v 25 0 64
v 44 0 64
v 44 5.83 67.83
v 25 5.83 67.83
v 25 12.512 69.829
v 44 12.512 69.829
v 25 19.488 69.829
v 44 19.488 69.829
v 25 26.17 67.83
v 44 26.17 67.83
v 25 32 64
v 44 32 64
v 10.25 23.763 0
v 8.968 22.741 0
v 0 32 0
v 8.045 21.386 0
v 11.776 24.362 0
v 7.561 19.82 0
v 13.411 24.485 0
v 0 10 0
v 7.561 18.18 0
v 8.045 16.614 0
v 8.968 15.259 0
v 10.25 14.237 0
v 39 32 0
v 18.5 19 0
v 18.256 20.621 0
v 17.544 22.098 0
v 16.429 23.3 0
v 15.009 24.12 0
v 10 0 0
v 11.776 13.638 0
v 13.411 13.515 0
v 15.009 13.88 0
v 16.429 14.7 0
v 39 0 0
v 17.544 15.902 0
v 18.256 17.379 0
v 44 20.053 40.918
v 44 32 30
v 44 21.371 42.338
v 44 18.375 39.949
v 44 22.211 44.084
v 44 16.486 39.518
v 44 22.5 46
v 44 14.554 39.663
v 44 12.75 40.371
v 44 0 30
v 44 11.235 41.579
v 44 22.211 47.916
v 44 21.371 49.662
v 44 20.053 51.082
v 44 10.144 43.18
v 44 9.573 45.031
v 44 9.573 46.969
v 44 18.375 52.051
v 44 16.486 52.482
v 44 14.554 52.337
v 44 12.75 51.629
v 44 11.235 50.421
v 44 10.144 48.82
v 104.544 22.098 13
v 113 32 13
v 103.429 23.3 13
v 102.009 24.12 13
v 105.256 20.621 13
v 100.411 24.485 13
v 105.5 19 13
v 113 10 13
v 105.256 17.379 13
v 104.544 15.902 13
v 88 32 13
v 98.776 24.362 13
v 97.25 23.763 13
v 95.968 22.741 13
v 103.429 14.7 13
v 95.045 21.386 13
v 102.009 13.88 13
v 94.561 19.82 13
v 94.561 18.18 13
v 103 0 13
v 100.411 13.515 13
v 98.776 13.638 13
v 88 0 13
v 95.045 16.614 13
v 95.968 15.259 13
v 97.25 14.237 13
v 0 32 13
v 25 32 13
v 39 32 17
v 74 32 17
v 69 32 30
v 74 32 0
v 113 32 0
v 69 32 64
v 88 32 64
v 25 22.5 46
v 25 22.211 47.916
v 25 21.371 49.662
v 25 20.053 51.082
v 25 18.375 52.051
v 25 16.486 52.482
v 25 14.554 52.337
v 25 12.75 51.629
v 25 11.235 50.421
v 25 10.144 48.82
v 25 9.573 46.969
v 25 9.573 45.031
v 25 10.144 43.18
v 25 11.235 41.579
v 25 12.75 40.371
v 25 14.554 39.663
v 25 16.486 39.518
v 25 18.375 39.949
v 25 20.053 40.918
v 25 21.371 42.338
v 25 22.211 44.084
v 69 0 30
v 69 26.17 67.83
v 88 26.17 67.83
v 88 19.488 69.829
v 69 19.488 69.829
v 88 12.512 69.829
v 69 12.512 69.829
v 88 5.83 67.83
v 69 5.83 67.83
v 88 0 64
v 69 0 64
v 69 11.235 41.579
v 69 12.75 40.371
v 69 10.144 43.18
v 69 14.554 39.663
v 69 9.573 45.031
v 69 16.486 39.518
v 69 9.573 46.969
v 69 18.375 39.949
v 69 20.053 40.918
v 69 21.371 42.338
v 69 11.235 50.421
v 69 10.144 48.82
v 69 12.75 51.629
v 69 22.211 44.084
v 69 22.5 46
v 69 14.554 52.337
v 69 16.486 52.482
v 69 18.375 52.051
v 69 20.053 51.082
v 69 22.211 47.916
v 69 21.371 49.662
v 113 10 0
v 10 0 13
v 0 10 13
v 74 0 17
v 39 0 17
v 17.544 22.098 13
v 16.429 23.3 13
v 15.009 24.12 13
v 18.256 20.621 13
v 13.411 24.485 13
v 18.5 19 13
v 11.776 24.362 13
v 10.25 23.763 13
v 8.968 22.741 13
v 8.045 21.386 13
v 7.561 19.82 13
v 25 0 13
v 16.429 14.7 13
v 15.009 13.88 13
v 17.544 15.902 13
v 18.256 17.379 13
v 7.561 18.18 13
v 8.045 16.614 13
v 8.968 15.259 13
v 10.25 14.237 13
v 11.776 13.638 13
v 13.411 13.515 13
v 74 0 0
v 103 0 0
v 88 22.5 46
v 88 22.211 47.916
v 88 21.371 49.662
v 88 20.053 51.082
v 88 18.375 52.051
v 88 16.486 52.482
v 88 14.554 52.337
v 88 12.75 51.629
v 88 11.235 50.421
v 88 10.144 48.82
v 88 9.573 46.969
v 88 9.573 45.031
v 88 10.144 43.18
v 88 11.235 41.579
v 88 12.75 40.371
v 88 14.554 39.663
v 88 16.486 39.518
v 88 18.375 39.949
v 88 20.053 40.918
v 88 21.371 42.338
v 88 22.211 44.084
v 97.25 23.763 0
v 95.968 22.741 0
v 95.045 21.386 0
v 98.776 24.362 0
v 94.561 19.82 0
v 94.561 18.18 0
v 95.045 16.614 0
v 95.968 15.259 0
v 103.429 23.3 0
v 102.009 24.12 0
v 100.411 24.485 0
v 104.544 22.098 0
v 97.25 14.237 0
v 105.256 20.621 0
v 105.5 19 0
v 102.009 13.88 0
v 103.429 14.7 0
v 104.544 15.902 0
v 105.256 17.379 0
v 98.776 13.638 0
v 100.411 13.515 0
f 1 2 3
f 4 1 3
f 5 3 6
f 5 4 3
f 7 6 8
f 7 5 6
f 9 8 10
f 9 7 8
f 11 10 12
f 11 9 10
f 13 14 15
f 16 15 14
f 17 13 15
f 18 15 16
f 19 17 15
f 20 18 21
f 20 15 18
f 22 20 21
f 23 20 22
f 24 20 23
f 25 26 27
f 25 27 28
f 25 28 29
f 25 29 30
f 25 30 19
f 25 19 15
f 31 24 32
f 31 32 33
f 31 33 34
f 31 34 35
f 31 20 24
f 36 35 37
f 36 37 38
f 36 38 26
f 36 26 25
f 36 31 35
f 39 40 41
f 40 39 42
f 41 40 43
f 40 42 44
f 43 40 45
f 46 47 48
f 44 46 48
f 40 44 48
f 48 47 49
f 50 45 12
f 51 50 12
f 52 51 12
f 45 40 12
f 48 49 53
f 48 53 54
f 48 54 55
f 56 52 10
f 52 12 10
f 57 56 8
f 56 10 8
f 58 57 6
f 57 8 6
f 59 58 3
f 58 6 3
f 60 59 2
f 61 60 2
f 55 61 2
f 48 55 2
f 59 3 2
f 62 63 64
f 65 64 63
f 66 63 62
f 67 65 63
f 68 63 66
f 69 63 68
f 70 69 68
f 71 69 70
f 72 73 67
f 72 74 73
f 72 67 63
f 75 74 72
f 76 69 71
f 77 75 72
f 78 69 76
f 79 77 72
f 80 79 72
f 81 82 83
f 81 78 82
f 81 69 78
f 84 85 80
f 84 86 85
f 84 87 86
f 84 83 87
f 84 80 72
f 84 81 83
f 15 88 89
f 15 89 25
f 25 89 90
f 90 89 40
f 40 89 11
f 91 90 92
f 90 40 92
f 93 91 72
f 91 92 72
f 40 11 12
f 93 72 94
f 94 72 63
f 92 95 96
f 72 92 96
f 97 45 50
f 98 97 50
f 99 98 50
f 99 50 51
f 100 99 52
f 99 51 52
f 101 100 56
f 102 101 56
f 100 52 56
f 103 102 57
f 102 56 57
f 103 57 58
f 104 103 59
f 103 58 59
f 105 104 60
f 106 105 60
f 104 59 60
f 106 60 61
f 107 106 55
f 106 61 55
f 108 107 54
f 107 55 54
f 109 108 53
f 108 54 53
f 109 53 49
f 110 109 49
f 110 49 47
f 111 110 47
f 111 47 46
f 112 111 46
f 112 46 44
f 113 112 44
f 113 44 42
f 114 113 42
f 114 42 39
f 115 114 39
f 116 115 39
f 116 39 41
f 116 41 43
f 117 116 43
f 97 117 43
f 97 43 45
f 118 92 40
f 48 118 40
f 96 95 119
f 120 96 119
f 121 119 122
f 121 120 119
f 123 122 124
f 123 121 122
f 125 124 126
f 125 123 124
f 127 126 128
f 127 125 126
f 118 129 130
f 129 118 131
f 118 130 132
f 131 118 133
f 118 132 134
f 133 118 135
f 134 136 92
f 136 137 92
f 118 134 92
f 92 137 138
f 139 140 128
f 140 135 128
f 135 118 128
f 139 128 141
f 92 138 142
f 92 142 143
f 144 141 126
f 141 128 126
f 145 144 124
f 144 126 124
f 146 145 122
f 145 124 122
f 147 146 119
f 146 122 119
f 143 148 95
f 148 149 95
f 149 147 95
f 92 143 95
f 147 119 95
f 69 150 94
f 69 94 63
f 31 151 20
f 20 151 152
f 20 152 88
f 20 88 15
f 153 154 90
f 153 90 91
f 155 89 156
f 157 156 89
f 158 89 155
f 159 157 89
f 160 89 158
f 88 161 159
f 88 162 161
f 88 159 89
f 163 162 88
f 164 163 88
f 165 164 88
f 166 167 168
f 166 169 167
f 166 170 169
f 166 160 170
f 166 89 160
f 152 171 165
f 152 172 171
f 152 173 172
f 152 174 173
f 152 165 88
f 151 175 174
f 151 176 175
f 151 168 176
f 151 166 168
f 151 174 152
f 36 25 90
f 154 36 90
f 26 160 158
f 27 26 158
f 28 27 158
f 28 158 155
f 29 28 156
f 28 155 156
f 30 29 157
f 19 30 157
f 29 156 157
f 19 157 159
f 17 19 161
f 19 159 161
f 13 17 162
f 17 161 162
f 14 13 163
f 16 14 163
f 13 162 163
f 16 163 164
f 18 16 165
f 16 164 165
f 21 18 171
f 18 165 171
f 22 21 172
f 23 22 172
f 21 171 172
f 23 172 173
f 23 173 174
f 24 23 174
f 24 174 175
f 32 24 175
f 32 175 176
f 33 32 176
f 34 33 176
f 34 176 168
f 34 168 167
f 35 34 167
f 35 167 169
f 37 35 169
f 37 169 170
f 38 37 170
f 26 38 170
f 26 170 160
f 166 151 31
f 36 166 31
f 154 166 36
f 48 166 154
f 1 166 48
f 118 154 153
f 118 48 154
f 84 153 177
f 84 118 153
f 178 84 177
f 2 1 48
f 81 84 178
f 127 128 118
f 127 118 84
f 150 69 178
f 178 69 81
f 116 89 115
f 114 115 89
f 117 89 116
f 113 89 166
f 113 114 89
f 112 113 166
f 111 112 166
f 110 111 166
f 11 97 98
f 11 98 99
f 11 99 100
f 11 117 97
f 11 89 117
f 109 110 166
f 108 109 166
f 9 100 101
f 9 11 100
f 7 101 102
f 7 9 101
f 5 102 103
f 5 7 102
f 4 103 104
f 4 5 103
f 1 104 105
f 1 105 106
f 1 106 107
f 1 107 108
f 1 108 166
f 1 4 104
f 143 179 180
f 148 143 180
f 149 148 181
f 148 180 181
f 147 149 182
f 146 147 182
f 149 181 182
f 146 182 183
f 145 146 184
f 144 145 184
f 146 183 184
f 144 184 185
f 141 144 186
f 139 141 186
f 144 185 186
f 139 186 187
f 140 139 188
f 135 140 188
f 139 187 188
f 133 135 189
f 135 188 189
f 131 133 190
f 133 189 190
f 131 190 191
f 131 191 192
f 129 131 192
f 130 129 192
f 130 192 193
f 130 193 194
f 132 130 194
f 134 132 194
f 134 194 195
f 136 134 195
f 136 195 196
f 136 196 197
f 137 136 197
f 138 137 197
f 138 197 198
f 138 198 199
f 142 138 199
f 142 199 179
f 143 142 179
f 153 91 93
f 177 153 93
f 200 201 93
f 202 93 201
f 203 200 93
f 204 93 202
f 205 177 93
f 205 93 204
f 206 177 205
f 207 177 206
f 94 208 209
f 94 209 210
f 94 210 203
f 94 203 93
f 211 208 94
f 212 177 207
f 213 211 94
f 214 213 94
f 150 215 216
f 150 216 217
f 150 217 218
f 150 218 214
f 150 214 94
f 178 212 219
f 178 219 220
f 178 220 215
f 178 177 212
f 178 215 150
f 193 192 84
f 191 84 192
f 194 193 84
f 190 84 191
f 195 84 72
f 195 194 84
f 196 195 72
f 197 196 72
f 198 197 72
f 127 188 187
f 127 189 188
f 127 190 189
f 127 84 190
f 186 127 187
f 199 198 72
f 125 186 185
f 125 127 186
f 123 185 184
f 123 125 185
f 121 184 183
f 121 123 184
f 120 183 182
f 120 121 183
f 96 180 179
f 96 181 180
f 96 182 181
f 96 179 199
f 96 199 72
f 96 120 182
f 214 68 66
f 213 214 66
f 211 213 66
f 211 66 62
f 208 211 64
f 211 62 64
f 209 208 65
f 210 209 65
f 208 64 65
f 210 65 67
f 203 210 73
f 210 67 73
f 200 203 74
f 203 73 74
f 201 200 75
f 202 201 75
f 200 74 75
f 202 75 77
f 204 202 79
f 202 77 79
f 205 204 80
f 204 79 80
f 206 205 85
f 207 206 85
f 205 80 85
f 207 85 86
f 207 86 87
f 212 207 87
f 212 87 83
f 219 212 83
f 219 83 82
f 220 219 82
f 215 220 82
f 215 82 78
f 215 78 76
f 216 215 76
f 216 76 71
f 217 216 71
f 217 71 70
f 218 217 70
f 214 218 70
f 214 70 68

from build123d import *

# Parameters (mm, degrees)
F1_DEPTH  = 32
F3_DEPTH  = 13.001
F5_DEPTH  = 13.001
F6_R      = 5.5
F7_DEPTH  = 13.001
F9_DEPTH  = 19
F11_DEPTH = 19
F13_R     = 6.5
F14_DEPTH = 100.001


with BuildPart() as f1:
    # F0 (on Front) → F1 (new body)
    with BuildSketch(Plane.XZ):
        Polygon((0, 13), (0, 0), (39, 0), (39, 17), (74, 17), (74, 0), (113, 0), (113, 13), (88, 13), (88, 64), (69, 64), (69, 30), (44, 30), (44, 64), (25, 64), (25, 13), align=None)
    extrude(amount=-F1_DEPTH)

    # F2 (on face) → F3 (cut, through all)
    with BuildSketch(Plane.XY.offset(13)):
        Polygon((113, 10), (103, 0), (113, 0), align=None)
    extrude(amount=-F3_DEPTH, mode=Mode.SUBTRACT)

    # F4 (on face) → F5 (cut, through all)
    with BuildSketch(Plane.XY.offset(13)):
        Polygon((0, 10), (0, 0), (10, 0), align=None)
    extrude(amount=-F5_DEPTH, mode=Mode.SUBTRACT)

    # F6 (on face) → F7 (cut, through all)
    with BuildSketch(Plane.XY.offset(13)):
        with Locations((13, 19)):
            Circle(F6_R)
        with Locations((100, 19)):
            Circle(F6_R)
    extrude(amount=-F7_DEPTH, mode=Mode.SUBTRACT)

    # F8 (on face) → F9 (join)
    with BuildSketch(Plane.YZ.offset(88)):
        with BuildLine():
            Line((0, 64), (32, 64))
            ThreePointArc((32, 64), (16, 70.083189), (0, 64))
        make_face()
    extrude(amount=-F9_DEPTH)

    # F10 (on face) → F11 (join)
    with BuildSketch(Plane(origin=(25, 0, 0), x_dir=(0, -1, 0), z_dir=(-1, 0, 0))):
        with BuildLine():
            Line((-32, 64), (0, 64))
            ThreePointArc((0, 64), (-16, 70.083189), (-32, 64))
        make_face()
    extrude(amount=-F11_DEPTH)

    # F13 (on offset) → F14 (cut, through all)
    with BuildSketch(Plane.YZ.offset(100)):
        with Locations((16, 46)):
            Circle(F13_R)
    extrude(amount=-F14_DEPTH, mode=Mode.SUBTRACT)


solid = f1.part
